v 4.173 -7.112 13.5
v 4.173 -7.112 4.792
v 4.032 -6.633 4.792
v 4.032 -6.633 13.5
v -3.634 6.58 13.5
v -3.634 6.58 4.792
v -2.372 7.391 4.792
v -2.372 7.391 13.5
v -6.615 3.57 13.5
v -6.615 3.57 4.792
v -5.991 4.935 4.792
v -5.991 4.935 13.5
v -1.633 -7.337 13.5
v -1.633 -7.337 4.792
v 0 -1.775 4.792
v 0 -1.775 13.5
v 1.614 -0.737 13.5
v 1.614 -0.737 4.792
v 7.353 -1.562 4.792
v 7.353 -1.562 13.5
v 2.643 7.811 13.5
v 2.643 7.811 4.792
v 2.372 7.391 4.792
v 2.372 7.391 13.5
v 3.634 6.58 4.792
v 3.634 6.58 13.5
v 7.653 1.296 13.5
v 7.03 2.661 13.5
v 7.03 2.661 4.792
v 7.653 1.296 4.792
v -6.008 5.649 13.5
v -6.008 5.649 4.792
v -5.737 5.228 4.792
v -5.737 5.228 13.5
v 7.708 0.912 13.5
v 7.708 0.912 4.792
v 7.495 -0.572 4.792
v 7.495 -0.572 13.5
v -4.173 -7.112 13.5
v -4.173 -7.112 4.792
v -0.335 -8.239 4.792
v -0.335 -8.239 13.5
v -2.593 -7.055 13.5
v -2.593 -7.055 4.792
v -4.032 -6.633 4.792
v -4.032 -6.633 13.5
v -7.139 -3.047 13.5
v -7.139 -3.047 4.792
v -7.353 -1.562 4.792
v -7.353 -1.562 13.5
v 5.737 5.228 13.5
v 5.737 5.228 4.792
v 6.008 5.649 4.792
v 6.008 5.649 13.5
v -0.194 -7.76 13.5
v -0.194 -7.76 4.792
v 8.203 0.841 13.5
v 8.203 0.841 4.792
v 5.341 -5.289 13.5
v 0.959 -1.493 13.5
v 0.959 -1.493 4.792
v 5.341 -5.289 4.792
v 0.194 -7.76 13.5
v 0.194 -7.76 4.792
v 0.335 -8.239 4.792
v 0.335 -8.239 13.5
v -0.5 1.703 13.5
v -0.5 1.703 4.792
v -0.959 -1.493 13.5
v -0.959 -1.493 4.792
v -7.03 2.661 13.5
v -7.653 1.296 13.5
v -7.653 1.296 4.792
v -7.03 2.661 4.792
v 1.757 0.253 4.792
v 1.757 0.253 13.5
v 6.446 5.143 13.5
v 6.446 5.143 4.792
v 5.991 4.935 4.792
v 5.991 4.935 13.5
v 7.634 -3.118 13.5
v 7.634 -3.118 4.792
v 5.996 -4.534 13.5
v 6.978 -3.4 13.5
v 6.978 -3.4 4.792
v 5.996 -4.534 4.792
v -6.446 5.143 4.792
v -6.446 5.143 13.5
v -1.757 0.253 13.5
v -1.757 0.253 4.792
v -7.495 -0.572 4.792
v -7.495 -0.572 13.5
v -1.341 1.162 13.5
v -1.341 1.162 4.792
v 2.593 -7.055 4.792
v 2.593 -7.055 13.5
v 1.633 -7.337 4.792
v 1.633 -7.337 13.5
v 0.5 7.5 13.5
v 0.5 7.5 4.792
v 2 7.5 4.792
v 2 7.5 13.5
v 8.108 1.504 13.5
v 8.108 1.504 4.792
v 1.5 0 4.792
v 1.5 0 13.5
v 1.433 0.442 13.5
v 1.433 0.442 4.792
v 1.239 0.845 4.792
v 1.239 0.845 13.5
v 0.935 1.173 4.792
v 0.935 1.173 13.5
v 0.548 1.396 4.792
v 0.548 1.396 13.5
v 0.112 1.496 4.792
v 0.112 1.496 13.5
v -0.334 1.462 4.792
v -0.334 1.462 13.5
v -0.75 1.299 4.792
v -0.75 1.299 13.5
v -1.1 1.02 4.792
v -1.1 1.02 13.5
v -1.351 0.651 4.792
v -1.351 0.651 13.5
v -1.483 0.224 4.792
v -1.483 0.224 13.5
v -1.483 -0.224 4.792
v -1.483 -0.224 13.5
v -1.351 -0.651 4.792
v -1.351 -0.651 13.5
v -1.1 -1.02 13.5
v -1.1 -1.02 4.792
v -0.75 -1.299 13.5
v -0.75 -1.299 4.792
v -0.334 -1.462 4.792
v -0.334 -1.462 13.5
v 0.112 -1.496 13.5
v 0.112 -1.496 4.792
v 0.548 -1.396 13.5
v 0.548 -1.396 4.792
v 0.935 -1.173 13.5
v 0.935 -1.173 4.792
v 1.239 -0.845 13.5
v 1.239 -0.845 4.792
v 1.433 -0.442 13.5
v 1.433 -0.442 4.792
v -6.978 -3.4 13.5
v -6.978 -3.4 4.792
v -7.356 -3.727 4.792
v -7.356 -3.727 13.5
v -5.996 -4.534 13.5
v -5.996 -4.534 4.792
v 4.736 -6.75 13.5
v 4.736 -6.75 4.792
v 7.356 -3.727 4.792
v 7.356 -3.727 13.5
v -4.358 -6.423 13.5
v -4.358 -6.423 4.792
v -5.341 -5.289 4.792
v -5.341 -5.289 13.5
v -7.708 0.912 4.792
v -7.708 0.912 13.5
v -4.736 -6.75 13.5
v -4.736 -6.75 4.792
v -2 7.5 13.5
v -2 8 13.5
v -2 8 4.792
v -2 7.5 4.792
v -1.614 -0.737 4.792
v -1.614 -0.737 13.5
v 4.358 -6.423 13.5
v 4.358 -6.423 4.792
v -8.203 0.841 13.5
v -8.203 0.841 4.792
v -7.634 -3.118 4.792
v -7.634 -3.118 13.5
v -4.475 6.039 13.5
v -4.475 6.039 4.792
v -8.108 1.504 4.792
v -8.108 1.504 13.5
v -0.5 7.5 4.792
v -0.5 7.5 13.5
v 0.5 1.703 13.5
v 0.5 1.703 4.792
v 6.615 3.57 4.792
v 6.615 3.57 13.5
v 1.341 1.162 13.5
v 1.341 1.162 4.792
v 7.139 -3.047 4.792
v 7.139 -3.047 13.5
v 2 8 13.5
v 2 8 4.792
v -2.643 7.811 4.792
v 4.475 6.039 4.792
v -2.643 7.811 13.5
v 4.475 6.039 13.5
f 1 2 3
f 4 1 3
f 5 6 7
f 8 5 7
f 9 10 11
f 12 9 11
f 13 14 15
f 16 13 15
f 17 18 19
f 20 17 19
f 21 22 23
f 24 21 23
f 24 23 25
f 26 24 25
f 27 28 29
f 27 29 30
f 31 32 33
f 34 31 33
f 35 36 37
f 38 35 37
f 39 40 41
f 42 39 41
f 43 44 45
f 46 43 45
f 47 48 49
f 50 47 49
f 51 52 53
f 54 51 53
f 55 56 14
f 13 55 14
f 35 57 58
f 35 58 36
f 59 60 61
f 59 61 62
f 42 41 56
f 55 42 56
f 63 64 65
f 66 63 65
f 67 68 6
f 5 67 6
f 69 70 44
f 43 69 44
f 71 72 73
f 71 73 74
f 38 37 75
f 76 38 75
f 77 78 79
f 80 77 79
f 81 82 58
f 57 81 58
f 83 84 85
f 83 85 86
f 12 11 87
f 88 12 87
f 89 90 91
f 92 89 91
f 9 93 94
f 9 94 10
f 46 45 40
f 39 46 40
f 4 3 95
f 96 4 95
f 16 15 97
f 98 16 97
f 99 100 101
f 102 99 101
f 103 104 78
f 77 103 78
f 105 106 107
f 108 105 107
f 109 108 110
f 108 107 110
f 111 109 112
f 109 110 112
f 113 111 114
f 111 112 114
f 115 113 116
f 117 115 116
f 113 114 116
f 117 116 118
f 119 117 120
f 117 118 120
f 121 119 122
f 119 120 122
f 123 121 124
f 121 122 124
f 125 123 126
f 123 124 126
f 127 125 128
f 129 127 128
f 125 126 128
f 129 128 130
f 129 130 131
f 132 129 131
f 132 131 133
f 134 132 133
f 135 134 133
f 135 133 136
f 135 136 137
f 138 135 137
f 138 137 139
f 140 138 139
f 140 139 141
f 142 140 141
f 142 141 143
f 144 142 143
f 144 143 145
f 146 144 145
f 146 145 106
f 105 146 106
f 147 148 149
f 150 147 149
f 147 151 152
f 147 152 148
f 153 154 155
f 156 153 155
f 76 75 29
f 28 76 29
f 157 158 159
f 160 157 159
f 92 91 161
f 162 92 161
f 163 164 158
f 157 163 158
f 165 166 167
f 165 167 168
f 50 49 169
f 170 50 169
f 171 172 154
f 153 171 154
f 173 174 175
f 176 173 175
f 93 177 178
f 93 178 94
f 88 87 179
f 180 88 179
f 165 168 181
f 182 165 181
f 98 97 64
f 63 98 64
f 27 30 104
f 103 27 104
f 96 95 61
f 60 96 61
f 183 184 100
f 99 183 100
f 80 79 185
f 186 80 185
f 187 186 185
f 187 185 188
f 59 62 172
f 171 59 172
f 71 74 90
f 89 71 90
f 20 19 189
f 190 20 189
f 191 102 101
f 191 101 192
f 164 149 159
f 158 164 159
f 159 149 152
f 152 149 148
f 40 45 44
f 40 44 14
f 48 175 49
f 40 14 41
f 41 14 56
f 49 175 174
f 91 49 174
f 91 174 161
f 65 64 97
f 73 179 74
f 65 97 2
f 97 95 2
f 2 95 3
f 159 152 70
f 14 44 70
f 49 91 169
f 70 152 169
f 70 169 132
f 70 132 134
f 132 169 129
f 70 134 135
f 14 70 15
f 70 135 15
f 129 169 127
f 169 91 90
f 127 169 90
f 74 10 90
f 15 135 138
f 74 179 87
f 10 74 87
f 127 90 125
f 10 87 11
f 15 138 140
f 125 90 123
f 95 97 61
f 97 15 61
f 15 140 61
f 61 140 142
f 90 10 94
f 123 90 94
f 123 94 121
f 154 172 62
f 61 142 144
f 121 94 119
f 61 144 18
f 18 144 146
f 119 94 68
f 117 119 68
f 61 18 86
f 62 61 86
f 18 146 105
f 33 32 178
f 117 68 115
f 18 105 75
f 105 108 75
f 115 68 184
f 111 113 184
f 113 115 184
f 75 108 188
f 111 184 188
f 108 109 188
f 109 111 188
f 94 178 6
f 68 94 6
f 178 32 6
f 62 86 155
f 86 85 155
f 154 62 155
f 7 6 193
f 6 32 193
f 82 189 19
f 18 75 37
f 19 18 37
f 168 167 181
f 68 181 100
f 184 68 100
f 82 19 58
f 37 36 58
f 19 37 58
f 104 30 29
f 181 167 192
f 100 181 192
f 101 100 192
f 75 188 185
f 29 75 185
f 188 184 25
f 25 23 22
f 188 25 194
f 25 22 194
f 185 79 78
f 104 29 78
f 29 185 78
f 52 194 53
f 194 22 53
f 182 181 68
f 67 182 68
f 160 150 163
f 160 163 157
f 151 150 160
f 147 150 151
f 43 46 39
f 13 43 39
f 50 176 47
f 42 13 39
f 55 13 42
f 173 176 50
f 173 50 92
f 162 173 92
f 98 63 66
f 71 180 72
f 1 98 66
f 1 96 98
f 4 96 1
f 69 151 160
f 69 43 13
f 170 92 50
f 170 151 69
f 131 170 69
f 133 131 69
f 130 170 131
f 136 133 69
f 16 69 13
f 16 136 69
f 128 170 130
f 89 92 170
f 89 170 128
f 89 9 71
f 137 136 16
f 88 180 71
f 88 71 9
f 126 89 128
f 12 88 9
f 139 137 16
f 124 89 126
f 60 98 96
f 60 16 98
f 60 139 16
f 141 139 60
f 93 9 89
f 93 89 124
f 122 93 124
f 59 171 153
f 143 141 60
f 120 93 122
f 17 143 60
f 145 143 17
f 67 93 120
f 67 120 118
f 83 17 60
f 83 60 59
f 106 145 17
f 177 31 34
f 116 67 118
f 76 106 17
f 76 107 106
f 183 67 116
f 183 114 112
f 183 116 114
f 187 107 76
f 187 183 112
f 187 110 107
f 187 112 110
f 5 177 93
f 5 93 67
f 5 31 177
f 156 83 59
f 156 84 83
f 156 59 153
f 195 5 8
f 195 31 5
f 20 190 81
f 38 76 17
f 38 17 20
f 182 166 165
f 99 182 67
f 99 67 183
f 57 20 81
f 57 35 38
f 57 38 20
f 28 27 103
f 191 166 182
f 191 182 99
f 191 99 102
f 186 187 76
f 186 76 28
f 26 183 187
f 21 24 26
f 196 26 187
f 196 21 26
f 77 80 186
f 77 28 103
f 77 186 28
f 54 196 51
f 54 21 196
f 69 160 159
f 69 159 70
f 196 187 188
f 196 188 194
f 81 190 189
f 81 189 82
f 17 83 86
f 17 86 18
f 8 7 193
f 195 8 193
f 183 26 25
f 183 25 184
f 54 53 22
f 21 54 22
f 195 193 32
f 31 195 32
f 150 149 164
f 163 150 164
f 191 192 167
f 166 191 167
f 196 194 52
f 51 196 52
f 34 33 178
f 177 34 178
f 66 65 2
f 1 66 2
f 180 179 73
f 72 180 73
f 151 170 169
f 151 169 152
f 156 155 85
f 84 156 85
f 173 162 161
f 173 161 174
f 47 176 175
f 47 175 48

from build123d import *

# Parameters (mm, degrees)
STOK_DYS_START             = 4.792312704
STOK_DYS_BE1806_13_1_DEPTH = 8.707687296
IZIM1_R                    = 1.5
KES_EKSTR_ZYON1_DEPTH      = 10


# Read off the part's stored shape, not the designer's step: Stok-DYS BE1806-13-1
with BuildPart() as part:
    # Stok-DYS BE1806-13-1 outline → Stok-DYS BE1806-13-1 (new body)
    with BuildSketch(Plane.XY.offset(STOK_DYS_START)):
        Polygon((2, 7.5), (2, 8), (-2, 8), (-2, 7.5), (-0.5, 7.5), (-0.5, 1.702843619), (-3.634179365, 6.579721905), (-2.372299065, 7.390683131), (-2.642619474, 7.811309898), (-6.007633605, 5.648746628), (-5.737313197, 5.228119861), (-4.475432897, 6.039081088), (-1.341253533, 1.162202802), (-6.614532459, 3.570428595), (-5.991409939, 4.934876588), (-6.446225937, 5.142584095), (-8.107885989, 1.504056113), (-7.653069991, 1.296348607), (-7.029947472, 2.6607966), (-1.756668546, 0.252570807), (-7.494818233, -0.572450566), (-7.708290491, 0.912281597), (-8.203201212, 0.841124178), (-7.633941859, -3.11816159), (-7.139031138, -3.047004171), (-7.352503395, -1.562272008), (-1.614353708, -0.737250635), (-5.995552175, -4.533580717), (-6.977843276, -3.399956356), (-7.355718063, -3.727386723), (-4.736275127, -6.75038502), (-4.35840034, -6.422954653), (-5.340691441, -5.289330292), (-0.959492974, -1.49300021), (-2.592740663, -7.055331024), (-4.031980124, -6.632732188), (-4.172846402, -7.112478675), (-0.334874508, -8.239408903), (-0.194008229, -7.759662416), (-1.63324769, -7.337063581), (0, -1.774732766), (1.63324769, -7.337063581), (0.194008229, -7.759662416), (0.334874508, -8.239408903), (4.172846402, -7.112478675), (4.031980124, -6.632732188), (2.592740663, -7.055331024), (0.959492974, -1.49300021), (5.340691441, -5.289330292), (4.35840034, -6.422954653), (4.736275127, -6.75038502), (7.355718063, -3.727386723), (6.977843276, -3.399956356), (5.995552175, -4.533580717), (1.614353708, -0.737250635), (7.352503395, -1.562272008), (7.139031138, -3.047004171), (7.633941859, -3.11816159), (8.203201212, 0.841124178), (7.708290491, 0.912281597), (7.494818233, -0.572450566), (1.756668546, 0.252570807), (7.029947472, 2.6607966), (7.653069991, 1.296348607), (8.107885989, 1.504056113), (6.446225937, 5.142584095), (5.991409939, 4.934876588), (6.614532459, 3.570428595), (1.341253533, 1.162202802), (4.475432897, 6.039081088), (5.737313197, 5.228119861), (6.007633605, 5.648746628), (2.642619474, 7.811309898), (2.372299065, 7.390683131), (3.634179364, 6.579721905), (0.5, 1.702843619), (0.5, 7.5), align=None)
    extrude(amount=STOK_DYS_BE1806_13_1_DEPTH)

    # Çizim1 → Kes-Ekstrüzyon1 (cut)
    with BuildSketch(Plane.XY.offset(13.5)):
        Circle(IZIM1_R)
    extrude(amount=-KES_EKSTR_ZYON1_DEPTH, mode=Mode.SUBTRACT)


solid = part.part
